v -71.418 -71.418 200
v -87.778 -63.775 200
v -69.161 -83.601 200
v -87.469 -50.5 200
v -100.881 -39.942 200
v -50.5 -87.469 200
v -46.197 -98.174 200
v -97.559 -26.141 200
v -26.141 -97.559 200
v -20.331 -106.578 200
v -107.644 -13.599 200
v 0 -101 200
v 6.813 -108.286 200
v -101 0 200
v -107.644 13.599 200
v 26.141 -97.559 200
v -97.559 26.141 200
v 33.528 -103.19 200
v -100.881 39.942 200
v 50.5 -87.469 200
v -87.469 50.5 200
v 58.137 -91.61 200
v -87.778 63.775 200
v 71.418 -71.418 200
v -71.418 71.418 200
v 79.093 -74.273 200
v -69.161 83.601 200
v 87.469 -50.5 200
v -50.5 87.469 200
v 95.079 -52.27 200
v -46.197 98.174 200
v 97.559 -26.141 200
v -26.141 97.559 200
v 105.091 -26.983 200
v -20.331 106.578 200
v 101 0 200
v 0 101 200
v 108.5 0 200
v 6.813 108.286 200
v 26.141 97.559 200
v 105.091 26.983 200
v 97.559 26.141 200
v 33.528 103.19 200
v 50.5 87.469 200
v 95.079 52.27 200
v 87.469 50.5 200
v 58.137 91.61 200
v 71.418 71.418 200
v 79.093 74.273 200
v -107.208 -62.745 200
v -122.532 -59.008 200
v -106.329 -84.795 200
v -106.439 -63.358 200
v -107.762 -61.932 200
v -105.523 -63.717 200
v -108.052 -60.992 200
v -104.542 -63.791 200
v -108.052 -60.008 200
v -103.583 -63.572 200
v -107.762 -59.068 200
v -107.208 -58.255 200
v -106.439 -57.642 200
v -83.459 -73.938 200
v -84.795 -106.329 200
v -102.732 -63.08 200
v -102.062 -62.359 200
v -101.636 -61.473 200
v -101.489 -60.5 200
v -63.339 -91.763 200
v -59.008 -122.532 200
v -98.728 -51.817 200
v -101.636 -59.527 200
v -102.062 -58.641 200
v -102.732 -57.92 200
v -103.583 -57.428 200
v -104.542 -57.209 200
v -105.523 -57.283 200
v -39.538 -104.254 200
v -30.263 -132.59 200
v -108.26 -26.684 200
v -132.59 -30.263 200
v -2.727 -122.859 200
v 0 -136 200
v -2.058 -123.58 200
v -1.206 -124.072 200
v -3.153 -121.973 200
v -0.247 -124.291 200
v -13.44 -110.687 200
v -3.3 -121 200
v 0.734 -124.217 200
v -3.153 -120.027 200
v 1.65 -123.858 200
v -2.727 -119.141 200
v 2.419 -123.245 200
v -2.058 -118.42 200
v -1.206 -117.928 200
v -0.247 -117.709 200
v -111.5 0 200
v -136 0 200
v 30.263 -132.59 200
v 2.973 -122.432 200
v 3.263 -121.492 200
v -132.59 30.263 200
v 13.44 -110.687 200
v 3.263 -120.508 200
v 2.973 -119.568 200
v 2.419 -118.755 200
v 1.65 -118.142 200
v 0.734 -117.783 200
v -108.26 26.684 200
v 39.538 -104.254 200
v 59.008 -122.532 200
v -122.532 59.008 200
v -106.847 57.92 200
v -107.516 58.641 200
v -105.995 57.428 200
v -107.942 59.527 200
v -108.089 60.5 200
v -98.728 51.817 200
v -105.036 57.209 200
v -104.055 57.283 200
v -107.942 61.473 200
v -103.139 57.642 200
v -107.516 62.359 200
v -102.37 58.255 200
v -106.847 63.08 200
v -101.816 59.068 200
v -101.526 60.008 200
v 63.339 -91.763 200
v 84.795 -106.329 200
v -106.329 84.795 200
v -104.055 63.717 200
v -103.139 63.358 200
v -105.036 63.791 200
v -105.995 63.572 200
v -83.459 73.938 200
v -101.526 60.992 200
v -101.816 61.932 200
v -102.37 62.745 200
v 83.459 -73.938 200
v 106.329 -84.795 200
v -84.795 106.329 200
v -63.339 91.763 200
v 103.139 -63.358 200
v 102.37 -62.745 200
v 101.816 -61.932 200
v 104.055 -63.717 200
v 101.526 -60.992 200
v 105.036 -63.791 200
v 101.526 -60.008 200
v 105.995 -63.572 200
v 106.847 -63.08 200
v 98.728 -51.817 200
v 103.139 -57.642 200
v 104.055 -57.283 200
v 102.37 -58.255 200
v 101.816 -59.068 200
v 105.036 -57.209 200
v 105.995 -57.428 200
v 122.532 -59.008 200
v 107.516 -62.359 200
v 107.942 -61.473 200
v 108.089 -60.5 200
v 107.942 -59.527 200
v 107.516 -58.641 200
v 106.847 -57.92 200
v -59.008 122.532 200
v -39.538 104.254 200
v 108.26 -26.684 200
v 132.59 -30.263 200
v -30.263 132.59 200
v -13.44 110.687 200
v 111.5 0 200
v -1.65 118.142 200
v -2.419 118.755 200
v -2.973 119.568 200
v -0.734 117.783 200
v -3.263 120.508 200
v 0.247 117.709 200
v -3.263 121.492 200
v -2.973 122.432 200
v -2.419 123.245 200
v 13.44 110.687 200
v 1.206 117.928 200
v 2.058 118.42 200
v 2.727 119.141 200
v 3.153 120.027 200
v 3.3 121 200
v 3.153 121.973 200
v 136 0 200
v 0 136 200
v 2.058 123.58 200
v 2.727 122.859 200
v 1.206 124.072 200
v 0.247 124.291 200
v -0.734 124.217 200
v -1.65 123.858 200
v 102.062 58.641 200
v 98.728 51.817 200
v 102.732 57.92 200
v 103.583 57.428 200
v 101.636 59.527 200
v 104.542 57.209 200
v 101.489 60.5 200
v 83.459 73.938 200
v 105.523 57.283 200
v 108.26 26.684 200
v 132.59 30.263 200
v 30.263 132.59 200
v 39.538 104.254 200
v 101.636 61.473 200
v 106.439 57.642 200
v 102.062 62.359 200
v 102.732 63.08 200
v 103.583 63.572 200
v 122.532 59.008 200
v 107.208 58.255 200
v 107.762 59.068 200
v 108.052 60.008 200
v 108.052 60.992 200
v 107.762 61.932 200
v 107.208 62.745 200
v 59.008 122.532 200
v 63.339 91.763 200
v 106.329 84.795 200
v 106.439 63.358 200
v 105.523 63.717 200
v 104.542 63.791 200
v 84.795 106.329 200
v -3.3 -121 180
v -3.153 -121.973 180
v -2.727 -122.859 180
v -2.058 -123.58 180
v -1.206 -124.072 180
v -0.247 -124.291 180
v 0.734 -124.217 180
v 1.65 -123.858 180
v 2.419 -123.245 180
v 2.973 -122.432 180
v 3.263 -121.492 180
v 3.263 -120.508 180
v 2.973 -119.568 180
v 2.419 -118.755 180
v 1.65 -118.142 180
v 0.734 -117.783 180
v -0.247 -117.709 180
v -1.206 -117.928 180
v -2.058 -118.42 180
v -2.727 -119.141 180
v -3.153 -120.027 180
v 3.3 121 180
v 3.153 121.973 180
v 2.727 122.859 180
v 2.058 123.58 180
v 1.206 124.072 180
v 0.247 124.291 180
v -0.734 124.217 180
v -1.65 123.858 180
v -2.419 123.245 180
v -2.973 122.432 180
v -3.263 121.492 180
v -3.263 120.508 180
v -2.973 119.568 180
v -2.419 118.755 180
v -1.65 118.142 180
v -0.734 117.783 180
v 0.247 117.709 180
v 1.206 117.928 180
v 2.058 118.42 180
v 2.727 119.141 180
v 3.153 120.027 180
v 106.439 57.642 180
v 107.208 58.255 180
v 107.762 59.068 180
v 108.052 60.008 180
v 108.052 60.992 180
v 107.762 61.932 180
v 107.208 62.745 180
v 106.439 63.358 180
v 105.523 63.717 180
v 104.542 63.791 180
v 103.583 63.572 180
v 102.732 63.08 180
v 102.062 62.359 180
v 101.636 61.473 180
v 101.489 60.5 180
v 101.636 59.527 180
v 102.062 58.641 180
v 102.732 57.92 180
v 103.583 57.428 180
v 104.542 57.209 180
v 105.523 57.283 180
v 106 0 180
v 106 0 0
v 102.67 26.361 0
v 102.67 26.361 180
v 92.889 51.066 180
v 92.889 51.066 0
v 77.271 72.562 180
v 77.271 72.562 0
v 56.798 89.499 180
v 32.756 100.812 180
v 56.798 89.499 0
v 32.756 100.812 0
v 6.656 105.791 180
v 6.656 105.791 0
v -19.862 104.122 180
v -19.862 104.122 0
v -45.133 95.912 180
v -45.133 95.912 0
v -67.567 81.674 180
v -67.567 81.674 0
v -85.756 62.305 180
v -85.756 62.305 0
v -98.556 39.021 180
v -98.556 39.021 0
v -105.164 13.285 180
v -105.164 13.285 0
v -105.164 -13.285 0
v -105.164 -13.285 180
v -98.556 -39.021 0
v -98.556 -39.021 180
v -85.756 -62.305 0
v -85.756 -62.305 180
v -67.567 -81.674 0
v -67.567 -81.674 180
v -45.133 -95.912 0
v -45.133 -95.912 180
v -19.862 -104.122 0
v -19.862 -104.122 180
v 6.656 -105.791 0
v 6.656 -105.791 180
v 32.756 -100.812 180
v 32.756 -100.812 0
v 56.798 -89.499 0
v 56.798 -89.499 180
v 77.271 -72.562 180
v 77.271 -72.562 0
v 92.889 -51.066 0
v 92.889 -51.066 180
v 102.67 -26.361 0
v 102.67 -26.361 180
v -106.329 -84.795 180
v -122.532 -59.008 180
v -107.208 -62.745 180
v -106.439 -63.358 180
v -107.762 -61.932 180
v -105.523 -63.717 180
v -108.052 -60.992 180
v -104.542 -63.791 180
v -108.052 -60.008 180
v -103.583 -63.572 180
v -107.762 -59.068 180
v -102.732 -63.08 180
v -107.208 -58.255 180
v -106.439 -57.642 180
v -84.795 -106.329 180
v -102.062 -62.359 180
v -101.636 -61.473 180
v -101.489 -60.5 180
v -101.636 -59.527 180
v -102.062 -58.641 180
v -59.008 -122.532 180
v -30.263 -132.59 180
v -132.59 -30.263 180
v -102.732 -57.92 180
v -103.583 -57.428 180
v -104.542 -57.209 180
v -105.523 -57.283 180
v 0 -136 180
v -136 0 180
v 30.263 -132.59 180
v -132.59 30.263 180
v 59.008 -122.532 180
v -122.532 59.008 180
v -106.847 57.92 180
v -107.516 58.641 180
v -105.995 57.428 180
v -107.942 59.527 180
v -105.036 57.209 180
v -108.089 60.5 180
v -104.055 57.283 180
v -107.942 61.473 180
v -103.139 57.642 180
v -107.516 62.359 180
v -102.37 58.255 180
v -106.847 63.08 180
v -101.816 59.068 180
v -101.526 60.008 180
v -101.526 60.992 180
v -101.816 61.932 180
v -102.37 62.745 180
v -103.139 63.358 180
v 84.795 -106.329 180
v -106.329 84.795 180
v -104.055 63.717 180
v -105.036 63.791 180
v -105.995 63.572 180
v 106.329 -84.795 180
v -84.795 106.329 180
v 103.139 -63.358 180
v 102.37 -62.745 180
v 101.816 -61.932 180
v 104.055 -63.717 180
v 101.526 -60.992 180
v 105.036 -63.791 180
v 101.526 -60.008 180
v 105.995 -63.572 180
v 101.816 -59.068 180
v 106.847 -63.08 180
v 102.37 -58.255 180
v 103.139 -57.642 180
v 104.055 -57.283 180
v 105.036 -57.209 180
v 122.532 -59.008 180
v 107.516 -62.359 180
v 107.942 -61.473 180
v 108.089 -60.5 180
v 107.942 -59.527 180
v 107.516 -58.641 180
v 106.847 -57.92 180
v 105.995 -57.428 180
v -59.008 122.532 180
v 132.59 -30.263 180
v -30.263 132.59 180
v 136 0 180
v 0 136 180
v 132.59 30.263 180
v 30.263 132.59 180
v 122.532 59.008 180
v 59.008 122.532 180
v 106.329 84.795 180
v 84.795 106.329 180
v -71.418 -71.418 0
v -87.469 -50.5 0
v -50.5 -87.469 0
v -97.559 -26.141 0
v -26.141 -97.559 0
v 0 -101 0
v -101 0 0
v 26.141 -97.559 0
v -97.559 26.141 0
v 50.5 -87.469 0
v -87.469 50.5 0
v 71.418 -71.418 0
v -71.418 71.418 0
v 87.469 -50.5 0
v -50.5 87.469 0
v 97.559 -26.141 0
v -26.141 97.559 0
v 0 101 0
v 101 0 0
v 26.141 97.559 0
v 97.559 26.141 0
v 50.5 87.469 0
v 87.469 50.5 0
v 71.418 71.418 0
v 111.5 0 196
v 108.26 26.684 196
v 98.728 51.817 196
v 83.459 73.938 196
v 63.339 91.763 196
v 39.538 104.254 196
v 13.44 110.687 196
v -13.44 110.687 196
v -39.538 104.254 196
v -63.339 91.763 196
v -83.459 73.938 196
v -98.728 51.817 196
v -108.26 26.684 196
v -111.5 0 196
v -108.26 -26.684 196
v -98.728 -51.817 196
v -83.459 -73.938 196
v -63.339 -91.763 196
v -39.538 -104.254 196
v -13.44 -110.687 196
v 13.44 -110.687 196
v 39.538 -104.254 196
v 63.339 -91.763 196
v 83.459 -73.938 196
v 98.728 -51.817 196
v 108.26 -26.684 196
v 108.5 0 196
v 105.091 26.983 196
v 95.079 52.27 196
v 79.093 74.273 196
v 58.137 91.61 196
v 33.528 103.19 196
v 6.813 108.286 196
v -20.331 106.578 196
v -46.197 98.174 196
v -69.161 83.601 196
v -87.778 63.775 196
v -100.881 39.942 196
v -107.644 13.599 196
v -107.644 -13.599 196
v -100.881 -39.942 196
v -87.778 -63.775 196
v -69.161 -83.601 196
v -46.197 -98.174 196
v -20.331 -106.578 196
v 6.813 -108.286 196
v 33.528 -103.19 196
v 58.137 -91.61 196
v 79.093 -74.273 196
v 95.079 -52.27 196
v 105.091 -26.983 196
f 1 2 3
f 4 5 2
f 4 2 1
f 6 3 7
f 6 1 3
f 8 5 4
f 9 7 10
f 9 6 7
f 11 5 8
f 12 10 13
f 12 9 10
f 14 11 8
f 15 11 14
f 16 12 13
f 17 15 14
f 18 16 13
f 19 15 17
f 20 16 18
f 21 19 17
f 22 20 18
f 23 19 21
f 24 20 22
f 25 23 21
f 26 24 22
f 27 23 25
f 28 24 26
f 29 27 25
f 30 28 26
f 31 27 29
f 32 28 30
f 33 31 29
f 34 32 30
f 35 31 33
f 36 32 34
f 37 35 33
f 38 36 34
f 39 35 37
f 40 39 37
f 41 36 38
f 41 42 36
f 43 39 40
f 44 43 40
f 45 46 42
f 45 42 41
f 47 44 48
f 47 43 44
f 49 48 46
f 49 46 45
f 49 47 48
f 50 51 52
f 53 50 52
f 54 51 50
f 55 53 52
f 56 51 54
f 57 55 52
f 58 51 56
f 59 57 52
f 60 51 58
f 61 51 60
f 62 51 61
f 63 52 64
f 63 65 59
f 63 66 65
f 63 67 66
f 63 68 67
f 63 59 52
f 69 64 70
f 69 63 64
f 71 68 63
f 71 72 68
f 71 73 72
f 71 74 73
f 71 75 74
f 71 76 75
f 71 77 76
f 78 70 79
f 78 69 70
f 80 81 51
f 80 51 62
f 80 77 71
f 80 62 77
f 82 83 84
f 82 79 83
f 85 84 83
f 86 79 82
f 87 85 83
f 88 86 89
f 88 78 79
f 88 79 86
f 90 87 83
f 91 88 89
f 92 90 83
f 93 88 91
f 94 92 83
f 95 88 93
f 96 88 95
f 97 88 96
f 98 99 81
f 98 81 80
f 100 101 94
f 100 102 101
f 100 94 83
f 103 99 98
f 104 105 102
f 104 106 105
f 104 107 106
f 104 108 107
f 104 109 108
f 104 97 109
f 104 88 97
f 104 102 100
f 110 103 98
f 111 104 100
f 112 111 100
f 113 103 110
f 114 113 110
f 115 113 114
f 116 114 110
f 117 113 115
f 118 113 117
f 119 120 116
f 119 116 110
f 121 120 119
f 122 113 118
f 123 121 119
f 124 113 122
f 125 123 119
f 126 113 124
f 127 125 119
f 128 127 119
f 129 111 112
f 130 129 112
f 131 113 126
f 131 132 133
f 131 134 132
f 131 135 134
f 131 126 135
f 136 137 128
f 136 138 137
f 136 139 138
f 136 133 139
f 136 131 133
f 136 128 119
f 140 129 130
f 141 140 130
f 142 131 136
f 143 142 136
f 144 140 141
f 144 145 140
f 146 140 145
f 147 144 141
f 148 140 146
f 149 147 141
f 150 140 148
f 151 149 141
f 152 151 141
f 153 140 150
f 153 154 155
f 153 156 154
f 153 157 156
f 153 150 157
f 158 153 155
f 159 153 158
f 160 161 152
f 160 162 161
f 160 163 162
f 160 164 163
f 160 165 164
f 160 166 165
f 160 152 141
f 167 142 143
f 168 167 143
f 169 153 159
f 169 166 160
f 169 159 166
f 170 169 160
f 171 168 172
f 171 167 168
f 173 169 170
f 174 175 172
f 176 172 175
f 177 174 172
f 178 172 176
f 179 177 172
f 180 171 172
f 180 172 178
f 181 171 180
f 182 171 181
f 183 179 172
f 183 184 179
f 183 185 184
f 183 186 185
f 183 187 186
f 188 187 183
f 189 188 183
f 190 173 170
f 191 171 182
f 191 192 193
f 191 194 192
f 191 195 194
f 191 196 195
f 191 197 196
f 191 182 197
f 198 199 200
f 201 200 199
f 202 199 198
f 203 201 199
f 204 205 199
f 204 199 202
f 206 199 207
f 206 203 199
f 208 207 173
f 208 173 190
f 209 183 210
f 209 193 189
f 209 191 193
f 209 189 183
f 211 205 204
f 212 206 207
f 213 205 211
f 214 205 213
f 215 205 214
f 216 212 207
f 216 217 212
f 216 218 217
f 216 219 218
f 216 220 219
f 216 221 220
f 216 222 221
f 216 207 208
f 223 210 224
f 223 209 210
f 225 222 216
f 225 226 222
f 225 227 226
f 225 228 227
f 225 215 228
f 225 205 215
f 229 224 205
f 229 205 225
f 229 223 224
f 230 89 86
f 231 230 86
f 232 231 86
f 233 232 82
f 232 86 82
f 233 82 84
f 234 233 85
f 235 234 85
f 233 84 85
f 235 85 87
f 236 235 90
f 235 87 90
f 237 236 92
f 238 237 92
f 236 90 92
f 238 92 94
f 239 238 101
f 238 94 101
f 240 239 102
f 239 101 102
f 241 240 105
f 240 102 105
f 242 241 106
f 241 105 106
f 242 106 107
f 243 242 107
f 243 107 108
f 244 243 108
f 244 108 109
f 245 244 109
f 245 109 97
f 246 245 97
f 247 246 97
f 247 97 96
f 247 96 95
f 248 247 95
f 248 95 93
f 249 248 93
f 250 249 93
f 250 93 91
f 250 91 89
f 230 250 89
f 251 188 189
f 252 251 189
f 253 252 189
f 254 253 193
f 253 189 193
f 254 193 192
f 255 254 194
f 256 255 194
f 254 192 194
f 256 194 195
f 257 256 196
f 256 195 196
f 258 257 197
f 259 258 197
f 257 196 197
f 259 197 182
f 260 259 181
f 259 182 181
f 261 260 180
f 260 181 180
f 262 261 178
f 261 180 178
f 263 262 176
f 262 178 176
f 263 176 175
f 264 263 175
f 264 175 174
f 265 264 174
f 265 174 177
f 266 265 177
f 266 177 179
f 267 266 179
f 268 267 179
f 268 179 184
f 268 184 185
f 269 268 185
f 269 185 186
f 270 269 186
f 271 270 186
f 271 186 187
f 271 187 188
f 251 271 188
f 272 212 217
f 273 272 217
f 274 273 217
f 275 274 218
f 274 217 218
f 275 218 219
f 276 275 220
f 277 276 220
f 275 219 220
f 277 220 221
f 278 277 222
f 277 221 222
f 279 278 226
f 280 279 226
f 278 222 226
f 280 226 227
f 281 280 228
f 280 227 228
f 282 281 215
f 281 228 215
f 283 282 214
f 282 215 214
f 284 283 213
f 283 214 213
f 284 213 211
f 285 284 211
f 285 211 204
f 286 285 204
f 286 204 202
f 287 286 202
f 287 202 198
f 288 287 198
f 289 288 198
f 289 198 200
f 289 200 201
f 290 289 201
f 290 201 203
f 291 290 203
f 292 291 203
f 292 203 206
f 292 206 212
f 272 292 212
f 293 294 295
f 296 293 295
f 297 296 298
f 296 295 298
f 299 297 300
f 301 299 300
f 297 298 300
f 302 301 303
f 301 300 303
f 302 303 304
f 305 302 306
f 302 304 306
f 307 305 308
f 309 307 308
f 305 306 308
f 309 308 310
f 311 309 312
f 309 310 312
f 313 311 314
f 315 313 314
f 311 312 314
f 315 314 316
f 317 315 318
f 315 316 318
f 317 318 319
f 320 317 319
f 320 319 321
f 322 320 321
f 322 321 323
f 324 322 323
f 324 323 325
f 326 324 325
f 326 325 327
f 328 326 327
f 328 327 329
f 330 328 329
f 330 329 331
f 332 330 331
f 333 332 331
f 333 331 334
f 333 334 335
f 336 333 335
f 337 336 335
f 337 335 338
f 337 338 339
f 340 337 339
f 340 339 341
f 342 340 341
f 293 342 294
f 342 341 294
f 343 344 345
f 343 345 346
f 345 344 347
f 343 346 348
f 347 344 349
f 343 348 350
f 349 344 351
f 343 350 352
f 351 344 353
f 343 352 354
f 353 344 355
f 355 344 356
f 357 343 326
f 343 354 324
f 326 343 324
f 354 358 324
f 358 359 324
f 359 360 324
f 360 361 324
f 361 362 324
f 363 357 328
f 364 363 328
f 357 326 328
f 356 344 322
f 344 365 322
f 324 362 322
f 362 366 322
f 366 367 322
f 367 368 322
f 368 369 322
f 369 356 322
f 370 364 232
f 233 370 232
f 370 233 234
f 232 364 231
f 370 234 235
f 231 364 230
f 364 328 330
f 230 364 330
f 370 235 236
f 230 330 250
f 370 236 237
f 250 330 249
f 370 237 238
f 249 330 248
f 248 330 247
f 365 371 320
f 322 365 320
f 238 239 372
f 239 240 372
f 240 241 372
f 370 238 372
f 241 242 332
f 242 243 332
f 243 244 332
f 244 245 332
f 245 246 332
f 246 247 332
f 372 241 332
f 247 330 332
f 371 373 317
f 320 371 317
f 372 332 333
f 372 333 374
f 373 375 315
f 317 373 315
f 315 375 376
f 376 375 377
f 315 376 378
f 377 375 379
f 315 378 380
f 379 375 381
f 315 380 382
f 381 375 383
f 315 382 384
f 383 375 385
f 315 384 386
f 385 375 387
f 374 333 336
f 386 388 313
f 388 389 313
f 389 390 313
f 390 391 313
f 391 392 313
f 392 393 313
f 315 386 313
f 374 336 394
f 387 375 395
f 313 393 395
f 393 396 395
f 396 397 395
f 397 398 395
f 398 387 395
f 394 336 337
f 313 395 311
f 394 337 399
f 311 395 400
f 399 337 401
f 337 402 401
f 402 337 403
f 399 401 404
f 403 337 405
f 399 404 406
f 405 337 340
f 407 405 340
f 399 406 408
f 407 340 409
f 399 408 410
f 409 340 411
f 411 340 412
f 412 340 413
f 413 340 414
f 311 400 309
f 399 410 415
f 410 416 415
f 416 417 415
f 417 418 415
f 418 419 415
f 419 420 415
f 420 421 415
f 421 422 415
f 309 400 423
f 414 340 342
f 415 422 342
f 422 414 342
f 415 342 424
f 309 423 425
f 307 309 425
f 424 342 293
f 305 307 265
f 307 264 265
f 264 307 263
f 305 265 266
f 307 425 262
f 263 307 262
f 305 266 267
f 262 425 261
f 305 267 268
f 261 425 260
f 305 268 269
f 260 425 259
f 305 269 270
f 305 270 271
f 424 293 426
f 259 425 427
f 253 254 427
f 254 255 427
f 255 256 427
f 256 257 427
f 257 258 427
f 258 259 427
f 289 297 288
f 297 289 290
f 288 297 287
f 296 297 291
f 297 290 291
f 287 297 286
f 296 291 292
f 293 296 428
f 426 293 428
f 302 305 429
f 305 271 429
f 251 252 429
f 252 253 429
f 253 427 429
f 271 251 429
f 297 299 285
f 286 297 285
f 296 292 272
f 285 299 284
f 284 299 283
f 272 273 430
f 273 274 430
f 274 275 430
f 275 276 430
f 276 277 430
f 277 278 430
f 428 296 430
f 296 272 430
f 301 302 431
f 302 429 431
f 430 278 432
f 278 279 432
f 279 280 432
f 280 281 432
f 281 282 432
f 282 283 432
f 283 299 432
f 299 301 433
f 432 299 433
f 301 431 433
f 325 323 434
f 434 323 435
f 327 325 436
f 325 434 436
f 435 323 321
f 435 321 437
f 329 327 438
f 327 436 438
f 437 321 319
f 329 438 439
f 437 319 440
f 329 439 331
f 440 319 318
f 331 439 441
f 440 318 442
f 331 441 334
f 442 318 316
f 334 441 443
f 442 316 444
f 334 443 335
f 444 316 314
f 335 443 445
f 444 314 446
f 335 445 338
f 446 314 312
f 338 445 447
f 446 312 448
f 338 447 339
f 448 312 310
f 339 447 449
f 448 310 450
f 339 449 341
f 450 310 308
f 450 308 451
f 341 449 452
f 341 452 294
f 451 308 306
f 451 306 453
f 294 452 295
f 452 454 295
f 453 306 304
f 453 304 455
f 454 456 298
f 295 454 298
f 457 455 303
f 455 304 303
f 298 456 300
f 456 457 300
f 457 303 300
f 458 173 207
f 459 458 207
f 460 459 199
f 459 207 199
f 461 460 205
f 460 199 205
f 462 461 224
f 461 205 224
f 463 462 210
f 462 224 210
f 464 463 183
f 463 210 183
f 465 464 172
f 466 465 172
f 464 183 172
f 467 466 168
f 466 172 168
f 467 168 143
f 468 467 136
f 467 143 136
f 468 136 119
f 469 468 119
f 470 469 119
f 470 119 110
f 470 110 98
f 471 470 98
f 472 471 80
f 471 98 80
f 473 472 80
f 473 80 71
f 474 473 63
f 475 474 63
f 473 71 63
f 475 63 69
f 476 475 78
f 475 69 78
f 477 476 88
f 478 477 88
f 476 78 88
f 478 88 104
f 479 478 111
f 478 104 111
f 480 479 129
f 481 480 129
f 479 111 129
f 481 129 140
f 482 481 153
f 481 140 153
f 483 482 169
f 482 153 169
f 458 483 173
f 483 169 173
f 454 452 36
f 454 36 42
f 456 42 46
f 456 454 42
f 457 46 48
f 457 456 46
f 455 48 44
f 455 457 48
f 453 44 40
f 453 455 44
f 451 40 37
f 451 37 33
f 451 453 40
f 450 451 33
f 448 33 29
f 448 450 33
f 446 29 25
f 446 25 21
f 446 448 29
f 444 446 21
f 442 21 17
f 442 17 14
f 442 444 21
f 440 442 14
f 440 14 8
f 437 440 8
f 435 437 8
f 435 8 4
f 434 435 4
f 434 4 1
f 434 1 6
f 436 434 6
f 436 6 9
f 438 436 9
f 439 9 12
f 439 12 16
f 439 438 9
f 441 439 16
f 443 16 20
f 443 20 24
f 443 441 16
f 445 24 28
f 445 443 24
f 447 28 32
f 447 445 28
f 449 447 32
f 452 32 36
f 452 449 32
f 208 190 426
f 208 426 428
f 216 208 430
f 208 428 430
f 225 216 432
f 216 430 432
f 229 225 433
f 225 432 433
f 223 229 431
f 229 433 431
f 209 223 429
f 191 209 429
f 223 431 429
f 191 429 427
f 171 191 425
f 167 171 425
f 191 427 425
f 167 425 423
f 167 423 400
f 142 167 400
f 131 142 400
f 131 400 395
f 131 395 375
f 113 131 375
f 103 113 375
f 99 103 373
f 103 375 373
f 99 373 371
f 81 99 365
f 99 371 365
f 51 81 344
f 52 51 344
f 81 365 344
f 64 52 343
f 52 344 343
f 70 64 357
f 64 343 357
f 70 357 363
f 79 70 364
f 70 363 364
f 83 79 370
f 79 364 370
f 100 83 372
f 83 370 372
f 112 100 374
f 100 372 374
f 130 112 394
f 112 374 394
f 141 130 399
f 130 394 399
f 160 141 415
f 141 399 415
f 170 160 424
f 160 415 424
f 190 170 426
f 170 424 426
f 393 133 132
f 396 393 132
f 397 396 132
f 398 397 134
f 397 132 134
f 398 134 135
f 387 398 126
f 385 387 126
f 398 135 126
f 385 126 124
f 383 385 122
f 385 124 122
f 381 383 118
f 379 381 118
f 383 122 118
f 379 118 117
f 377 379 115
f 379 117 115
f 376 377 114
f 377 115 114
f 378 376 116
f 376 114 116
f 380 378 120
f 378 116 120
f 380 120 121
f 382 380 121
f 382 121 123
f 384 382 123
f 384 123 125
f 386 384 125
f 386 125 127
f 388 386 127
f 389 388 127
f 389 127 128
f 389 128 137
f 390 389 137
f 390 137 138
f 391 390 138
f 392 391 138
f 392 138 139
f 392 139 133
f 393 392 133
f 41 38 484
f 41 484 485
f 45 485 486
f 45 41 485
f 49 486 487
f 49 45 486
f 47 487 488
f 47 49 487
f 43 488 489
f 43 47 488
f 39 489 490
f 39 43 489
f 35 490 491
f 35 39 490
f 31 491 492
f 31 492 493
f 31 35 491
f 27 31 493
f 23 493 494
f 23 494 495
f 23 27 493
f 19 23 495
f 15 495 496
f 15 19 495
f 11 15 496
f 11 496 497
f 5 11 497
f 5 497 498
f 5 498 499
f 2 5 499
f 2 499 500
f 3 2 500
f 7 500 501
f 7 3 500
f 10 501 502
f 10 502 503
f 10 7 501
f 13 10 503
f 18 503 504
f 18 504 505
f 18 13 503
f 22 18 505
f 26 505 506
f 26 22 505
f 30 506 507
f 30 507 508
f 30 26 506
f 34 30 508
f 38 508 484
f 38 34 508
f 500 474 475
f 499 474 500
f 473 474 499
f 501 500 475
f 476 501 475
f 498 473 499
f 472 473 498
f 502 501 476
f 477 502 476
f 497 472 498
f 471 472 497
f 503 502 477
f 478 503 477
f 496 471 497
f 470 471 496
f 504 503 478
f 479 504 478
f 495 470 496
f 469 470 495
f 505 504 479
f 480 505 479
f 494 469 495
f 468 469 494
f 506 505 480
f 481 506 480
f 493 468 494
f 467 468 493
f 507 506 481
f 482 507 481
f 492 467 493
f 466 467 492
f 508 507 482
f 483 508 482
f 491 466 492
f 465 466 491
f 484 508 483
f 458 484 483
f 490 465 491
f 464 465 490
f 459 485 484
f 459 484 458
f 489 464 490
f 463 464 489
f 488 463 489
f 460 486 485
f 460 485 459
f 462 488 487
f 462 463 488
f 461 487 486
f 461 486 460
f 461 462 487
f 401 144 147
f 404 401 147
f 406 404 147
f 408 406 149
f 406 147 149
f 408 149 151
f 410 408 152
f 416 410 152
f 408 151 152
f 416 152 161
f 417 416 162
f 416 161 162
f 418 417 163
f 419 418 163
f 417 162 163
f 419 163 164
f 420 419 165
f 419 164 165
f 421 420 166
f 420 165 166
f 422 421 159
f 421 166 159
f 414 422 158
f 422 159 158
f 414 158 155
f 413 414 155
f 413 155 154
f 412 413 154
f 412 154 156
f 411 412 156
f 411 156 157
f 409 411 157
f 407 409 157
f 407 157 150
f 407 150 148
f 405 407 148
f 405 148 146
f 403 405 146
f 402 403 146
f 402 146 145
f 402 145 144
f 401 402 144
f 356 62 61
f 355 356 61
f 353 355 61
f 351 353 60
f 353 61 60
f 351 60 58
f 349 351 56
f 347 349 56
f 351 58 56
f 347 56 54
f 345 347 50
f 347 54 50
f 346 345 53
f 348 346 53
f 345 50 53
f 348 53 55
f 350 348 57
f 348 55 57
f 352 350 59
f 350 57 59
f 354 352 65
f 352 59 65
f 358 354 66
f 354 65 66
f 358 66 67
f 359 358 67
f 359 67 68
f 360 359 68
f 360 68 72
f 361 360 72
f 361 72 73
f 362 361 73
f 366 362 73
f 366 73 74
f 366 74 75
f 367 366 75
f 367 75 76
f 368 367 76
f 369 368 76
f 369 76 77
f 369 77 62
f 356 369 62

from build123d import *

# Parameters (mm, degrees)
SKETCH1_R           = 106
SKETCH1_R_2         = 101
BOSS_EXTRUDE1_DEPTH = 200
BOSS_EXTRUDE3_START = -20
SKETCH3_R           = 136
SKETCH3_R_2         = 106
BOSS_EXTRUDE3_DEPTH = 20
SKETCH5_R           = 111.5
SKETCH5_R_2         = 108.5
CUT_EXTRUDE1_DEPTH  = 4
SKETCH4_R           = 3.3
CUT_EXTRUDE2_DEPTH  = 33
CIRPATTERN1_COUNT   = 6


with BuildPart() as part:
    # Sketch1 → Boss-Extrude1 (new body)
    with BuildSketch(Plane.XY):
        Circle(SKETCH1_R)
        Circle(SKETCH1_R_2, mode=Mode.SUBTRACT)
    extrude(amount=BOSS_EXTRUDE1_DEPTH)

    # Sketch3 → Boss-Extrude3 (add)
    with BuildSketch(Plane.XY.offset(200).offset(BOSS_EXTRUDE3_START)):
        Circle(SKETCH3_R)
        Circle(SKETCH3_R_2, mode=Mode.SUBTRACT)
    extrude(amount=BOSS_EXTRUDE3_DEPTH)

    # Sketch5 → Cut-Extrude1 (cut)
    with BuildSketch(Plane.XY.offset(200)):
        Circle(SKETCH5_R)
        Circle(SKETCH5_R_2, mode=Mode.SUBTRACT)
    extrude(amount=-CUT_EXTRUDE1_DEPTH, mode=Mode.SUBTRACT)

    # Sketch4 → Cut-Extrude2 (cut)
    with BuildSketch(Plane.XY.offset(200)):
        with Locations((0, 121)):
            Circle(SKETCH4_R)
    cut_extrude2 = extrude(amount=-CUT_EXTRUDE2_DEPTH, mode=Mode.SUBTRACT)

    # CirPattern1: Cut-Extrude2 ×6 about axis
    cirpattern1_axis = Axis((0, 0, 0), (0, 0, 1))
    for i in range(1, CIRPATTERN1_COUNT):
        add(cut_extrude2.rotate(cirpattern1_axis, i * 360 / CIRPATTERN1_COUNT), mode=Mode.SUBTRACT)


solid = part.part
